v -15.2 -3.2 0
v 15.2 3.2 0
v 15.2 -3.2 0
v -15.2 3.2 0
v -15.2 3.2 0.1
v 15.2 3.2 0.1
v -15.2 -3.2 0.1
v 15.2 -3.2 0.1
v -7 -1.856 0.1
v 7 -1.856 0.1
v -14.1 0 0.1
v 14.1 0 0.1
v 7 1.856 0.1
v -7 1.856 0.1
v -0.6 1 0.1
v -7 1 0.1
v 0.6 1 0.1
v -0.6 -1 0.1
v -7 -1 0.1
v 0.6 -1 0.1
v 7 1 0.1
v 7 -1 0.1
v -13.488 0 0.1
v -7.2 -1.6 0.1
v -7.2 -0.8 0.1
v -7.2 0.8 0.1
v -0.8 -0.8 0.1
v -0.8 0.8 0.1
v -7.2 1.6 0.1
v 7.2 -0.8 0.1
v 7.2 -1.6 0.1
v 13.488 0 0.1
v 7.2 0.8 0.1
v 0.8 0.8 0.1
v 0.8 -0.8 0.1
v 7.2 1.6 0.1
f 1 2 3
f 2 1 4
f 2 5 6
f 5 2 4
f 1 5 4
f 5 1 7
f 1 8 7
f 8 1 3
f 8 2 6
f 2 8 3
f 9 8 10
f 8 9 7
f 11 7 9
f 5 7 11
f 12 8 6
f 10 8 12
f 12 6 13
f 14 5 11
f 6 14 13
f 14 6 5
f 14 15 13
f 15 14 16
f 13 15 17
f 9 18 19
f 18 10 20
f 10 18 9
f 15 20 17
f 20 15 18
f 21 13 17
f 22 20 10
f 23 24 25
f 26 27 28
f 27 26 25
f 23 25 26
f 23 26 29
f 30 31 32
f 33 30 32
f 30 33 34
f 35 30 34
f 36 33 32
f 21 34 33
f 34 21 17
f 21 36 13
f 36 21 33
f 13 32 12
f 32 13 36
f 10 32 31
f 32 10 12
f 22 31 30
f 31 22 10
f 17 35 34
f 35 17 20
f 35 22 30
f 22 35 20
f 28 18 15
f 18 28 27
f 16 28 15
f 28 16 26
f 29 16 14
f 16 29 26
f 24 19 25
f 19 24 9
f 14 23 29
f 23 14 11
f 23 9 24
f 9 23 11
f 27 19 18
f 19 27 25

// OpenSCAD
// file: ../p/4-4edge.scad
use <../lib.scad>
$fa=1; $fs=0.2;
function ldraw_lib__4_4edge(realsolid=false) = [
// 0 Circle 1.0
// 0 Name: 4-4edge.dat
// 0 Author: James Jessiman
// 0 !LDRAW_ORG Primitive UPDATE 2017-01
// 0 !LICENSE Licensed under CC BY 2.0 and CC BY 4.0 : see CAreadme.txt
// 
// 0 BFC CERTIFY CCW
  [0,"BFC","CERTIFY"],
  [0,"BFC","CCW"],
// 
// 0 !HISTORY 1998-12-15 [PTadmin] Official Update 1998-10
// 0 !HISTORY 2005-12-28 [PTadmin] Official Update 2005-01
// 0 !HISTORY 2007-06-24 [PTadmin] Header formatted for Contributor Agreement
// 0 !HISTORY 2008-07-01 [PTadmin] Official Update 2008-01
// 0 !HISTORY 2017-01-15 [Steffen] BFCed
// 0 !HISTORY 2017-12-30 [PTadmin] Official Update 2017-01
// 
// 
// 2 24 1 0 0 0.9239 0 0.3827
  [2,24,1,0,0,0.9239,0,0.3827],
// 2 24 0.9239 0 0.3827 0.7071 0 0.7071
  [2,24,0.9239,0,0.3827,0.7071,0,0.7071],
// 2 24 0.7071 0 0.7071 0.3827 0 0.9239
  [2,24,0.7071,0,0.7071,0.3827,0,0.9239],
// 2 24 0.3827 0 0.9239 0 0 1
  [2,24,0.3827,0,0.9239,0,0,1],
// 2 24 0 0 1 -0.3827 0 0.9239
  [2,24,0,0,1,-0.3827,0,0.9239],
// 2 24 -0.3827 0 0.9239 -0.7071 0 0.7071
  [2,24,-0.3827,0,0.9239,-0.7071,0,0.7071],
// 2 24 -0.7071 0 0.7071 -0.9239 0 0.3827
  [2,24,-0.7071,0,0.7071,-0.9239,0,0.3827],
// 2 24 -0.9239 0 0.3827 -1 0 -0
  [2,24,-0.9239,0,0.3827,-1,0,-0],
// 2 24 -1 0 -0 -0.9239 0 -0.3827
  [2,24,-1,0,-0,-0.9239,0,-0.3827],
// 2 24 -0.9239 0 -0.3827 -0.7071 0 -0.7071
  [2,24,-0.9239,0,-0.3827,-0.7071,0,-0.7071],
// 2 24 -0.7071 0 -0.7071 -0.3827 0 -0.9239
  [2,24,-0.7071,0,-0.7071,-0.3827,0,-0.9239],
// 2 24 -0.3827 0 -0.9239 0 0 -1
  [2,24,-0.3827,0,-0.9239,0,0,-1],
// 2 24 0 0 -1 0.3827 0 -0.9239
  [2,24,0,0,-1,0.3827,0,-0.9239],
// 2 24 0.3827 0 -0.9239 0.7071 0 -0.7071
  [2,24,0.3827,0,-0.9239,0.7071,0,-0.7071],
// 2 24 0.7071 0 -0.7071 0.9239 0 -0.3827
  [2,24,0.7071,0,-0.7071,0.9239,0,-0.3827],
// 2 24 0.9239 0 -0.3827 1 0 0
  [2,24,0.9239,0,-0.3827,1,0,0],
];
module ldraw_lib__4_4edge(step=0, col=false, unit=2/5, alt=false, line=0.2, solid=!$preview)
    makepoly(ldraw_lib__4_4edge(solid), step=step, col=col, unit=unit, alt=alt, line=line, solid=solid);
ldraw_lib__4_4edge(line=0.2);
// file: ../p/4-4disc.scad
use <../lib.scad>
$fa=1; $fs=0.2;
function ldraw_lib__4_4disc(realsolid=false) = [
// 0 Disc 1.0
// 0 Name: 4-4disc.dat
// 0 Author: James Jessiman
// 0 !LDRAW_ORG Primitive UPDATE 2002-02
// 0 !LICENSE Licensed under CC BY 2.0 and CC BY 4.0 : see CAreadme.txt
// 
// 0 BFC CERTIFY CCW
  [0,"BFC","CERTIFY"],
  [0,"BFC","CCW"],
// 
// 0 !HISTORY 1998-12-15 [PTadmin] Official Update 1998-10
// 0 !HISTORY 2002-03-23 [sbliss] Added BFC statement
// 0 !HISTORY 2002-04-25 [PTadmin] Official Update 2002-02
// 0 !HISTORY 2007-06-24 [PTadmin] Header formatted for Contributor Agreement
// 0 !HISTORY 2008-07-01 [PTadmin] Official Update 2008-01
// 
// 
// 3 16 0 0 0 1 0 0 0.9239 0 0.3827
  [3,16,0,0,0,1,0,0,0.9239,0,0.3827],
// 3 16 0 0 0 0.9239 0 0.3827 0.7071 0 0.7071
  [3,16,0,0,0,0.9239,0,0.3827,0.7071,0,0.7071],
// 3 16 0 0 0 0.7071 0 0.7071 0.3827 0 0.9239
  [3,16,0,0,0,0.7071,0,0.7071,0.3827,0,0.9239],
// 3 16 0 0 0 0.3827 0 0.9239 0 0 1
  [3,16,0,0,0,0.3827,0,0.9239,0,0,1],
// 3 16 0 0 0 0 0 1 -0.3827 0 0.9239
  [3,16,0,0,0,0,0,1,-0.3827,0,0.9239],
// 3 16 0 0 0 -0.3827 0 0.9239 -0.7071 0 0.7071
  [3,16,0,0,0,-0.3827,0,0.9239,-0.7071,0,0.7071],
// 3 16 0 0 0 -0.7071 0 0.7071 -0.9239 0 0.3827
  [3,16,0,0,0,-0.7071,0,0.7071,-0.9239,0,0.3827],
// 3 16 0 0 0 -0.9239 0 0.3827 -1 0 -0
  [3,16,0,0,0,-0.9239,0,0.3827,-1,0,-0],
// 3 16 0 0 0 -1 0 -0 -0.9239 0 -0.3827
  [3,16,0,0,0,-1,0,-0,-0.9239,0,-0.3827],
// 3 16 0 0 0 -0.9239 0 -0.3827 -0.7071 0 -0.7071
  [3,16,0,0,0,-0.9239,0,-0.3827,-0.7071,0,-0.7071],
// 3 16 0 0 0 -0.7071 0 -0.7071 -0.3827 0 -0.9239
  [3,16,0,0,0,-0.7071,0,-0.7071,-0.3827,0,-0.9239],
// 3 16 0 0 0 -0.3827 0 -0.9239 0 0 -1
  [3,16,0,0,0,-0.3827,0,-0.9239,0,0,-1],
// 3 16 0 0 0 0 0 -1 0.3827 0 -0.9239
  [3,16,0,0,0,0,0,-1,0.3827,0,-0.9239],
// 3 16 0 0 0 0.3827 0 -0.9239 0.7071 0 -0.7071
  [3,16,0,0,0,0.3827,0,-0.9239,0.7071,0,-0.7071],
// 3 16 0 0 0 0.7071 0 -0.7071 0.9239 0 -0.3827
  [3,16,0,0,0,0.7071,0,-0.7071,0.9239,0,-0.3827],
// 3 16 0 0 0 0.9239 0 -0.3827 1 0 0
  [3,16,0,0,0,0.9239,0,-0.3827,1,0,0],
// 0
];
module ldraw_lib__4_4disc(step=0, col=false, unit=2/5, alt=false, line=0.2, solid=!$preview)
    makepoly(ldraw_lib__4_4disc(solid), step=step, col=col, unit=unit, alt=alt, line=line, solid=solid);
ldraw_lib__4_4disc(line=0.2);
// file: ../p/4-4cyli.scad
use <../lib.scad>
$fa=1; $fs=0.2;
function ldraw_lib__4_4cyli(realsolid=false) = [
// 0 Cylinder 1.0
// 0 Name: 4-4cyli.dat
// 0 Author: James Jessiman
// 0 !LDRAW_ORG Primitive UPDATE 2005-01
// 0 !LICENSE Licensed under CC BY 2.0 and CC BY 4.0 : see CAreadme.txt
// 
// 0 BFC CERTIFY CCW
  [0,"BFC","CERTIFY"],
  [0,"BFC","CCW"],
// 
// 0 !HISTORY 1998-12-15 [PTadmin] Official Update 1998-10
// 0 !HISTORY 2002-03-23 [sbliss] Added BFC statement; merged headers from files in distributions LDraw 0.27 and Complete.
// 0 !HISTORY 2002-04-25 [PTadmin] Official Update 2002-02
// 0 !HISTORY 2004-12-14 [guyvivan] BFC CCW
// 0 !HISTORY 2005-12-28 [PTadmin] Official Update 2005-01
// 0 !HISTORY 2007-06-24 [PTadmin] Header formatted for Contributor Agreement
// 0 !HISTORY 2008-07-01 [PTadmin] Official Update 2008-01
// 
// 
// 4 16 1 1 0 0.9239 1 0.3827 0.9239 0 0.3827 1 0 0
  [4,16,1,1,0,0.9239,1,0.3827,0.9239,0,0.3827,1,0,0],
// 5 24 1 0 0 1 1 0 0.9239 0 0.3827 0.9239 0 -0.3827
  [5,24,1,0,0,1,1,0,0.9239,0,0.3827,0.9239,0,-0.3827],
// 4 16 0.9239 1 0.3827 0.7071 1 0.7071 0.7071 0 0.7071 0.9239 0 0.3827
  [4,16,0.9239,1,0.3827,0.7071,1,0.7071,0.7071,0,0.7071,0.9239,0,0.3827],
// 5 24 0.9239 0 0.3827 0.9239 1 0.3827 0.7071 0 0.7071 1 0 0
  [5,24,0.9239,0,0.3827,0.9239,1,0.3827,0.7071,0,0.7071,1,0,0],
// 4 16 0.7071 1 0.7071 0.3827 1 0.9239 0.3827 0 0.9239 0.7071 0 0.7071
  [4,16,0.7071,1,0.7071,0.3827,1,0.9239,0.3827,0,0.9239,0.7071,0,0.7071],
// 5 24 0.7071 0 0.7071 0.7071 1 0.7071 0.3827 0 0.9239 0.9239 0 0.3827
  [5,24,0.7071,0,0.7071,0.7071,1,0.7071,0.3827,0,0.9239,0.9239,0,0.3827],
// 4 16 0.3827 1 0.9239 0 1 1 0 0 1 0.3827 0 0.9239
  [4,16,0.3827,1,0.9239,0,1,1,0,0,1,0.3827,0,0.9239],
// 5 24 0.3827 0 0.9239 0.3827 1 0.9239 0 0 1 0.7071 0 0.7071
  [5,24,0.3827,0,0.9239,0.3827,1,0.9239,0,0,1,0.7071,0,0.7071],
// 4 16 0 1 1 -0.3827 1 0.9239 -0.3827 0 0.9239 0 0 1
  [4,16,0,1,1,-0.3827,1,0.9239,-0.3827,0,0.9239,0,0,1],
// 5 24 0 0 1 0 1 1 -0.3827 0 0.9239 0.3827 0 0.9239
  [5,24,0,0,1,0,1,1,-0.3827,0,0.9239,0.3827,0,0.9239],
// 4 16 -0.3827 1 0.9239 -0.7071 1 0.7071 -0.7071 0 0.7071 -0.3827 0 0.9239
  [4,16,-0.3827,1,0.9239,-0.7071,1,0.7071,-0.7071,0,0.7071,-0.3827,0,0.9239],
// 5 24 -0.3827 0 0.9239 -0.3827 1 0.9239 -0.7071 0 0.7071 0 0 1
  [5,24,-0.3827,0,0.9239,-0.3827,1,0.9239,-0.7071,0,0.7071,0,0,1],
// 4 16 -0.7071 1 0.7071 -0.9239 1 0.3827 -0.9239 0 0.3827 -0.7071 0 0.7071
  [4,16,-0.7071,1,0.7071,-0.9239,1,0.3827,-0.9239,0,0.3827,-0.7071,0,0.7071],
// 5 24 -0.7071 0 0.7071 -0.7071 1 0.7071 -0.9239 0 0.3827 -0.3827 0 0.9239
  [5,24,-0.7071,0,0.7071,-0.7071,1,0.7071,-0.9239,0,0.3827,-0.3827,0,0.9239],
// 4 16 -0.9239 1 0.3827 -1 1 0 -1 0 0 -0.9239 0 0.3827
  [4,16,-0.9239,1,0.3827,-1,1,0,-1,0,0,-0.9239,0,0.3827],
// 5 24 -0.9239 0 0.3827 -0.9239 1 0.3827 -1 0 0 -0.7071 0 0.7071
  [5,24,-0.9239,0,0.3827,-0.9239,1,0.3827,-1,0,0,-0.7071,0,0.7071],
// 4 16 -1 1 0 -0.9239 1 -0.3827 -0.9239 0 -0.3827 -1 0 0
  [4,16,-1,1,0,-0.9239,1,-0.3827,-0.9239,0,-0.3827,-1,0,0],
// 5 24 -1 0 0 -1 1 0 -0.9239 0 -0.3827 -0.9239 0 0.3827
  [5,24,-1,0,0,-1,1,0,-0.9239,0,-0.3827,-0.9239,0,0.3827],
// 4 16 -0.9239 1 -0.3827 -0.7071 1 -0.7071 -0.7071 0 -0.7071 -0.9239 0 -0.3827
  [4,16,-0.9239,1,-0.3827,-0.7071,1,-0.7071,-0.7071,0,-0.7071,-0.9239,0,-0.3827],
// 5 24 -0.9239 0 -0.3827 -0.9239 1 -0.3827 -0.7071 0 -0.7071 -1 0 0
  [5,24,-0.9239,0,-0.3827,-0.9239,1,-0.3827,-0.7071,0,-0.7071,-1,0,0],
// 4 16 -0.7071 1 -0.7071 -0.3827 1 -0.9239 -0.3827 0 -0.9239 -0.7071 0 -0.7071
  [4,16,-0.7071,1,-0.7071,-0.3827,1,-0.9239,-0.3827,0,-0.9239,-0.7071,0,-0.7071],
// 5 24 -0.7071 0 -0.7071 -0.7071 1 -0.7071 -0.3827 0 -0.9239 -0.9239 0 -0.3827
  [5,24,-0.7071,0,-0.7071,-0.7071,1,-0.7071,-0.3827,0,-0.9239,-0.9239,0,-0.3827],
// 4 16 -0.3827 1 -0.9239 0 1 -1 0 0 -1 -0.3827 0 -0.9239
  [4,16,-0.3827,1,-0.9239,0,1,-1,0,0,-1,-0.3827,0,-0.9239],
// 5 24 -0.3827 0 -0.9239 -0.3827 1 -0.9239 0 0 -1 -0.7071 0 -0.7071
  [5,24,-0.3827,0,-0.9239,-0.3827,1,-0.9239,0,0,-1,-0.7071,0,-0.7071],
// 4 16 0 1 -1 0.3827 1 -0.9239 0.3827 0 -0.9239 0 0 -1
  [4,16,0,1,-1,0.3827,1,-0.9239,0.3827,0,-0.9239,0,0,-1],
// 5 24 0 0 -1 0 1 -1 0.3827 0 -0.9239 -0.3827 0 -0.9239
  [5,24,0,0,-1,0,1,-1,0.3827,0,-0.9239,-0.3827,0,-0.9239],
// 4 16 0.3827 1 -0.9239 0.7071 1 -0.7071 0.7071 0 -0.7071 0.3827 0 -0.9239
  [4,16,0.3827,1,-0.9239,0.7071,1,-0.7071,0.7071,0,-0.7071,0.3827,0,-0.9239],
// 5 24 0.3827 0 -0.9239 0.3827 1 -0.9239 0.7071 0 -0.7071 0 0 -1
  [5,24,0.3827,0,-0.9239,0.3827,1,-0.9239,0.7071,0,-0.7071,0,0,-1],
// 4 16 0.7071 1 -0.7071 0.9239 1 -0.3827 0.9239 0 -0.3827 0.7071 0 -0.7071
  [4,16,0.7071,1,-0.7071,0.9239,1,-0.3827,0.9239,0,-0.3827,0.7071,0,-0.7071],
// 5 24 0.7071 0 -0.7071 0.7071 1 -0.7071 0.9239 0 -0.3827 0.3827 0 -0.9239
  [5,24,0.7071,0,-0.7071,0.7071,1,-0.7071,0.9239,0,-0.3827,0.3827,0,-0.9239],
// 4 16 0.9239 1 -0.3827 1 1 0 1 0 0 0.9239 0 -0.3827
  [4,16,0.9239,1,-0.3827,1,1,0,1,0,0,0.9239,0,-0.3827],
// 5 24 0.9239 0 -0.3827 0.9239 1 -0.3827 1 0 0 0.7071 0 -0.7071
  [5,24,0.9239,0,-0.3827,0.9239,1,-0.3827,1,0,0,0.7071,0,-0.7071],
// 0
];
module ldraw_lib__4_4cyli(step=0, col=false, unit=2/5, alt=false, line=0.2, solid=!$preview)
    makepoly(ldraw_lib__4_4cyli(solid), step=step, col=col, unit=unit, alt=alt, line=line, solid=solid);
ldraw_lib__4_4cyli(line=0.2);
// file: ../p/stud3.scad
use <../lib.scad>
use <4-4cyli.scad>
use <4-4disc.scad>
use <4-4edge.scad>
$fa=1; $fs=0.2;
function ldraw_lib__stud3(realsolid=false) = realsolid ? 
    [openscad(translate([0,0,-eps()], o=cylinder(4+eps(), r=4)),2)] : [
// 0 Stud Tube Solid
// 0 Name: stud3.dat
// 0 Author: James Jessiman
// 0 !LDRAW_ORG Primitive UPDATE 2012-01
// 0 !LICENSE Licensed under CC BY 2.0 and CC BY 4.0 : see CAreadme.txt
// 
// 0 BFC CERTIFY CCW
  [0,"BFC","CERTIFY"],
  [0,"BFC","CCW"],
// 
// 0 !HISTORY 2002-04-04 [sbliss] Modified for BFC compliance
// 0 !HISTORY 2002-04-25 [PTadmin] Official Update 2002-02
// 0 !HISTORY 2007-06-24 [PTadmin] Header formatted for Contributor Agreement
// 0 !HISTORY 2008-07-01 [PTadmin] Official Update 2008-01
// 0 !HISTORY 2012-02-16 [Philo] Changed to CCW
// 0 !HISTORY 2012-03-30 [PTadmin] Official Update 2012-01
// 
// 
// 1 16 0 -4 0 4 0 0 0 1 0 0 0 4 4-4edge.dat
  [1,16,0,-4,0,4,0,0,0,1,0,0,0,4, ldraw_lib__4_4edge(realsolid)],
// 1 16 0 0 0 4 0 0 0 1 0 0 0 4 4-4edge.dat
  [1,16,0,0,0,4,0,0,0,1,0,0,0,4, ldraw_lib__4_4edge(realsolid)],
// 1 16 0 -4 0 4 0 0 0 1 0 0 0 4 4-4disc.dat
  [1,16,0,-4,0,4,0,0,0,1,0,0,0,4, ldraw_lib__4_4disc(realsolid)],
// 1 16 0 -4 0 4 0 0 0 4 0 0 0 4 4-4cyli.dat
  [1,16,0,-4,0,4,0,0,0,4,0,0,0,4, ldraw_lib__4_4cyli(realsolid)],
];
module ldraw_lib__stud3(step=0, col=false, unit=2/5, alt=false, line=0.2, solid=!$preview)
    makepoly(ldraw_lib__stud3(solid), step=step, col=col, unit=unit, alt=alt, line=line, solid=solid);
ldraw_lib__stud3(line=0.2);
// file: ../p/stud.scad
use <../lib.scad>
use <4-4cyli.scad>
use <4-4disc.scad>
use <4-4edge.scad>
$fa=1; $fs=0.2;
function ldraw_lib__stud(realsolid=false) = realsolid ? 
    [openscad(translate([0,0,-eps()], o=cylinder(4+eps(), r=6)),2)] : [
// 0 Stud
// 0 Name: stud.dat
// 0 Author: James Jessiman
// 0 !LDRAW_ORG Primitive UPDATE 2012-01
// 0 !LICENSE Licensed under CC BY 2.0 and CC BY 4.0 : see CAreadme.txt
// 
// 0 BFC CERTIFY CCW
  [0,"BFC","CERTIFY"],
  [0,"BFC","CCW"],
// 
// 0 !HISTORY 2002-04-04 [sbliss] Modified for BFC compliance
// 0 !HISTORY 2002-04-25 [PTadmin] Official Update 2002-02
// 0 !HISTORY 2007-06-24 [PTadmin] Header formatted for Contributor Agreement
// 0 !HISTORY 2008-07-01 [PTadmin] Official Update 2008-01
// 0 !HISTORY 2012-02-16 [Philo] Changed to CCW
// 0 !HISTORY 2012-03-30 [PTadmin] Official Update 2012-01
// 
// 
// 1 16 0 0 0 6 0 0 0 1 0 0 0 6 4-4edge.dat
  [1,16,0,0,0,6,0,0,0,1,0,0,0,6, ldraw_lib__4_4edge(realsolid)],
// 1 16 0 -4 0 6 0 0 0 1 0 0 0 6 4-4edge.dat
  [1,16,0,-4,0,6,0,0,0,1,0,0,0,6, ldraw_lib__4_4edge(realsolid)],
// 1 16 0 0 0 6 0 0 0 -4 0 0 0 6 4-4cyli.dat
  [1,16,0,0,0,6,0,0,0,-4,0,0,0,6, ldraw_lib__4_4cyli(realsolid)],
// 1 16 0 -4 0 6 0 0 0 1 0 0 0 6 4-4disc.dat
  [1,16,0,-4,0,6,0,0,0,1,0,0,0,6, ldraw_lib__4_4disc(realsolid)],
];
module ldraw_lib__stud(step=0, col=false, unit=2/5, alt=false, line=0.2, solid=!$preview)
    makepoly(ldraw_lib__stud(solid), step=step, col=col, unit=unit, alt=alt, line=line, solid=solid);
ldraw_lib__stud(line=0.2);
// file: ../p/box5.scad
use <../lib.scad>
$fa=1; $fs=0.2;
function ldraw_lib__box5(realsolid=false) = [
// 0 Box with 5 Faces and All Edges
// 0 Name: box5.dat
// 0 Author: James Jessiman
// 0 !LDRAW_ORG Primitive UPDATE 2012-01
// 0 !LICENSE Licensed under CC BY 2.0 and CC BY 4.0 : see CAreadme.txt
// 
// 0 BFC CERTIFY CCW
  [0,"BFC","CERTIFY"],
  [0,"BFC","CCW"],
// 
// 0 !HISTORY 2002-04-03 [sbliss] Modified for BFC compliance
// 0 !HISTORY 2002-04-25 [PTadmin] Official Update 2002-02
// 0 !HISTORY 2007-06-24 [PTadmin] Header formatted for Contributor Agreement
// 0 !HISTORY 2008-07-01 [PTadmin] Official Update 2008-01
// 0 !HISTORY 2012-02-16 [Philo] Changed to CCW
// 0 !HISTORY 2012-03-30 [PTadmin] Official Update 2012-01
// 
// 
// 2 24 1 1 1 -1 1 1
  [2,24,1,1,1,-1,1,1],
// 2 24 -1 1 1 -1 1 -1
  [2,24,-1,1,1,-1,1,-1],
// 2 24 -1 1 -1 1 1 -1
  [2,24,-1,1,-1,1,1,-1],
// 2 24 1 1 -1 1 1 1
  [2,24,1,1,-1,1,1,1],
// 2 24 1 0 1 -1 0 1
  [2,24,1,0,1,-1,0,1],
// 2 24 -1 0 1 -1 0 -1
  [2,24,-1,0,1,-1,0,-1],
// 2 24 -1 0 -1 1 0 -1
  [2,24,-1,0,-1,1,0,-1],
// 2 24 1 0 -1 1 0 1
  [2,24,1,0,-1,1,0,1],
// 2 24 1 0 1 1 1 1
  [2,24,1,0,1,1,1,1],
// 2 24 -1 0 1 -1 1 1
  [2,24,-1,0,1,-1,1,1],
// 2 24 1 0 -1 1 1 -1
  [2,24,1,0,-1,1,1,-1],
// 2 24 -1 0 -1 -1 1 -1
  [2,24,-1,0,-1,-1,1,-1],
// 4 16 -1 1 1 1 1 1 1 1 -1 -1 1 -1
  [4,16,-1,1,1,1,1,1,1,1,-1,-1,1,-1],
// 4 16 -1 1 1 -1 0 1 1 0 1 1 1 1
  [4,16,-1,1,1,-1,0,1,1,0,1,1,1,1],
// 4 16 -1 1 -1 -1 0 -1 -1 0 1 -1 1 1
  [4,16,-1,1,-1,-1,0,-1,-1,0,1,-1,1,1],
// 4 16 1 1 -1 1 0 -1 -1 0 -1 -1 1 -1
  [4,16,1,1,-1,1,0,-1,-1,0,-1,-1,1,-1],
// 4 16 1 1 1 1 0 1 1 0 -1 1 1 -1
  [4,16,1,1,1,1,0,1,1,0,-1,1,1,-1],
];
module ldraw_lib__box5(step=0, col=false, unit=2/5, alt=false, line=0.2, solid=!$preview)
    makepoly(ldraw_lib__box5(solid), step=step, col=col, unit=unit, alt=alt, line=line, solid=solid);
ldraw_lib__box5(line=0.2);
// file: ../p/box4t.scad
use <../lib.scad>
$fa=1; $fs=0.2;
function ldraw_lib__box4t(realsolid=false) = [
// 0 Box with 4 Adjacent Faces and All Edges
// 0 Name: box4t.dat
// 0 Author: Tore Eriksson [Tore_Eriksson]
// 0 !LDRAW_ORG Primitive UPDATE 2003-02
// 0 !LICENSE Licensed under CC BY 2.0 and CC BY 4.0 : see CAreadme.txt
// 
// 0 BFC CERTIFY CCW
  [0,"BFC","CERTIFY"],
  [0,"BFC","CCW"],
// 
// 0 !HISTORY 1997-09-29 [PTadmin] Official Update 1997-15
// 0 !HISTORY 2002-08-31 [izanette] Modified with WINDZ for BFC compliance
// 0 !HISTORY 2003-08-01 [PTadmin] Official Update 2003-02
// 0 !HISTORY 2007-06-24 [PTadmin] Header formatted for Contributor Agreement
// 0 !HISTORY 2008-07-01 [PTadmin] Official Update 2008-01
// 
// 
// 2 24 1 1 1 -1 1 1
  [2,24,1,1,1,-1,1,1],
// 2 24 -1 1 1 -1 1 -1
  [2,24,-1,1,1,-1,1,-1],
// 2 24 -1 1 -1 1 1 -1
  [2,24,-1,1,-1,1,1,-1],
// 2 24 1 1 -1 1 1 1
  [2,24,1,1,-1,1,1,1],
// 2 24 1 0 1 -1 0 1
  [2,24,1,0,1,-1,0,1],
// 2 24 -1 0 1 -1 0 -1
  [2,24,-1,0,1,-1,0,-1],
// 2 24 -1 0 -1 1 0 -1
  [2,24,-1,0,-1,1,0,-1],
// 2 24 1 0 -1 1 0 1
  [2,24,1,0,-1,1,0,1],
// 2 24 1 0 1 1 1 1
  [2,24,1,0,1,1,1,1],
// 2 24 -1 0 1 -1 1 1
  [2,24,-1,0,1,-1,1,1],
// 2 24 1 0 -1 1 1 -1
  [2,24,1,0,-1,1,1,-1],
// 2 24 -1 0 -1 -1 1 -1
  [2,24,-1,0,-1,-1,1,-1],
// 4 16 1 1 1 1 1 -1 -1 1 -1 -1 1 1
  [4,16,1,1,1,1,1,-1,-1,1,-1,-1,1,1],
// 4 16 1 1 1 -1 1 1 -1 0 1 1 0 1
  [4,16,1,1,1,-1,1,1,-1,0,1,1,0,1],
// 4 16 -1 1 1 -1 1 -1 -1 0 -1 -1 0 1
  [4,16,-1,1,1,-1,1,-1,-1,0,-1,-1,0,1],
// 0 4 16 -1 1 -1 -1 0 -1 1 0 -1 1 1 -1
// 4 16 1 1 -1 1 1 1 1 0 1 1 0 -1
  [4,16,1,1,-1,1,1,1,1,0,1,1,0,-1],
// 0
];
module ldraw_lib__box4t(step=0, col=false, unit=2/5, alt=false, line=0.2, solid=!$preview)
    makepoly(ldraw_lib__box4t(solid), step=step, col=col, unit=unit, alt=alt, line=line, solid=solid);
ldraw_lib__box4t(line=0.2);
// file: s/3004s01.scad
use <../../lib.scad>
use <../../p/box4t.scad>
use <../../p/box5.scad>
use <../../p/stud.scad>
use <../../p/stud3.scad>
$fa=1; $fs=0.2;
function ldraw_lib__s__3004s01(realsolid=false) = [
// 0 ~Brick  1 x  2 without Front Face
// 0 Name: s\3004s01.dat
// 0 Author: James Jessiman
// 0 !LDRAW_ORG Subpart UPDATE 2003-03
// 0 !LICENSE Licensed under CC BY 2.0 and CC BY 4.0 : see CAreadme.txt
// 
// 0 BFC CERTIFY CCW
  [0,"BFC","CERTIFY"],
  [0,"BFC","CCW"],
// 
// 0 !HISTORY 2003-09-07 [jriley] Subfiling, BFC
// 0 !HISTORY 2003-12-19 [PTadmin] Official Update 2003-03
// 0 !HISTORY 2007-08-29 [PTadmin] Header formatted for Contributor Agreement
// 0 !HISTORY 2008-07-01 [PTadmin] Official Update 2008-01
// 
// 
// 1 16 0 4 0 1 0 0 0 -5 0 0 0 1 stud3.dat
  [1,16,0,4,0,1,0,0,0,-5,0,0,0,1, ldraw_lib__stud3(realsolid)],
// 0 BFC INVERTNEXT
  [0,"BFC","INVERTNEXT"],
// 1 16 0 24 0 16 0 0 0 -20 0 0 0 6 box5.dat
  [1,16,0,24,0,16,0,0,0,-20,0,0,0,6, ldraw_lib__box5(realsolid)],
// 4 16 20 24 10 16 24 6 -16 24 6 -20 24 10
  [4,16,20,24,10,16,24,6,-16,24,6,-20,24,10],
// 4 16 -20 24 10 -16 24 6 -16 24 -6 -20 24 -10
  [4,16,-20,24,10,-16,24,6,-16,24,-6,-20,24,-10],
// 4 16 -20 24 -10 -16 24 -6 16 24 -6 20 24 -10
  [4,16,-20,24,-10,-16,24,-6,16,24,-6,20,24,-10],
// 4 16 20 24 -10 16 24 -6 16 24 6 20 24 10
  [4,16,20,24,-10,16,24,-6,16,24,6,20,24,10],
// 1 16 0 24 0 20 0 0 0 -24 0 0 0 10 box4t.dat
  [1,16,0,24,0,20,0,0,0,-24,0,0,0,10, ldraw_lib__box4t(realsolid)],
// 1 16 10 0 0 1 0 0 0 1 0 0 0 1 stud.dat
  [1,16,10,0,0,1,0,0,0,1,0,0,0,1, ldraw_lib__stud(realsolid)],
// 1 16 -10 0 0 1 0 0 0 1 0 0 0 1 stud.dat
  [1,16,-10,0,0,1,0,0,0,1,0,0,0,1, ldraw_lib__stud(realsolid)],
// 0
];
module ldraw_lib__s__3004s01(step=0, col=false, unit=2/5, alt=false, line=0.2, solid=!$preview)
    makepoly(ldraw_lib__s__3004s01(solid), step=step, col=col, unit=unit, alt=alt, line=line, solid=solid);
ldraw_lib__s__3004s01(line=0.2);
// file: 3004.scad
use <../lib.scad>
use <s/3004s01.scad>
$fa=1; $fs=0.2;
function ldraw_lib__3004(realsolid=false) = [
// 0 Brick  1 x  2
// 0 Name: 3004.dat
// 0 Author: James Jessiman
// 0 !LDRAW_ORG Part UPDATE 2022-05
// 0 !LICENSE Licensed under CC BY 2.0 and CC BY 4.0 : see CAreadme.txt
// 
// 0 BFC CERTIFY CCW
  [0,"BFC","CERTIFY"],
  [0,"BFC","CCW"],
// 
// 0 !HISTORY 2001-10-26 [PTadmin] Official Update 2001-01
// 0 !HISTORY 2002-05-07 {unknown} BFC Certification
// 0 !HISTORY 2002-06-11 [PTadmin] Official Update 2002-03
// 0 !HISTORY 2007-05-07 [PTadmin] Header formatted for Contributor Agreement
// 0 !HISTORY 2008-07-01 [PTadmin] Official Update 2008-01
// 0 !HISTORY 2022-08-04 [MagFors] Using subfile
// 0 !HISTORY 2022-09-15 [PTadmin] Official Update 2022-05
// 
// 
// 1 16 0 0 0 1 0 0 0 1 0 0 0 1 s\3004s01.dat
  [1,16,0,0,0,1,0,0,0,1,0,0,0,1, ldraw_lib__s__3004s01(realsolid)],
// 4 16 -20 24 -10 20 24 -10 20 0 -10 -20 0 -10
  [4,16,-20,24,-10,20,24,-10,20,0,-10,-20,0,-10],
];
module ldraw_lib__3004(step=0, col=false, unit=2/5, alt=false, line=0.2, solid=!$preview)
    makepoly(ldraw_lib__3004(solid), step=step, col=col, unit=unit, alt=alt, line=line, solid=solid);
ldraw_lib__3004(line=0.2);
// file: ../p/box5-12.scad
use <../lib.scad>
$fa=1; $fs=0.2;
function ldraw_lib__box5_12(realsolid=false) = [
// 0 Box with 5 Faces without Any Edges
// 0 Name: box5-12.dat
// 0 Author: Chris Dee [cwdee]
// 0 !LDRAW_ORG Primitive UPDATE 2009-02
// 0 !LICENSE Licensed under CC BY 2.0 and CC BY 4.0 : see CAreadme.txt
// 
// 0 BFC CERTIFY CCW
  [0,"BFC","CERTIFY"],
  [0,"BFC","CCW"],
// 
// 0 !HISTORY 2009-09-03 [PTadmin] Official Update 2009-02
// 
// 
// 4 16 1 1 1 1 1 -1 -1 1 -1 -1 1 1
  [4,16,1,1,1,1,1,-1,-1,1,-1,-1,1,1],
// 4 16 -1 0 1 1 0 1 1 1 1 -1 1 1
  [4,16,-1,0,1,1,0,1,1,1,1,-1,1,1],
// 4 16 -1 0 -1 -1 0 1 -1 1 1 -1 1 -1
  [4,16,-1,0,-1,-1,0,1,-1,1,1,-1,1,-1],
// 4 16 1 0 -1 -1 0 -1 -1 1 -1 1 1 -1
  [4,16,1,0,-1,-1,0,-1,-1,1,-1,1,1,-1],
// 4 16 1 0 1 1 0 -1 1 1 -1 1 1 1
  [4,16,1,0,1,1,0,-1,1,1,-1,1,1,1],
// 0
];
module ldraw_lib__box5_12(step=0, col=false, unit=2/5, alt=false, line=0.2, solid=!$preview)
    makepoly(ldraw_lib__box5_12(solid), step=step, col=col, unit=unit, alt=alt, line=line, solid=solid);
ldraw_lib__box5_12(line=0.2);
// main file
use <../lib.scad>
use <../p/box5-12.scad>
$fa=1; $fs=0.2;
function ldraw_lib__169675e(realsolid=false) = [
// 0 Sticker  0.8 x  3.8 with Two White Opposing Direction Arrows
// 0 Name: 169675e.dat
// 0 Author: Ulrich Röder [UR]
// 0 !LDRAW_ORG Part UPDATE 2019-01
// 0 !LICENSE Licensed under CC BY 2.0 and CC BY 4.0 : see CAreadme.txt
// 
// 0 BFC CERTIFY CCW
  [0,"BFC","CERTIFY"],
  [0,"BFC","CCW"],
// 
// 0 !KEYWORDS Cargo, Set 4555, Station, Train, Transport
// 
// 0 !HISTORY 2019-06-28 [PTadmin] Official Update 2019-01
// 
// 
// 0 // Main
// 
// 1 16 0 -.25 0 38 0 0 0 .25 0 0 0 8 box5-12.dat
  [1,16,0,-.25,0,38,0,0,0,.25,0,0,0,8, ldraw_lib__box5_12(realsolid)],
// 4 16 -17.5 -.25 -4.64 -38 -.25 -8 38 -.25 -8 17.5 -.25 -4.64
  [4,16,-17.5,-.25,-4.64,-38,-.25,-8,38,-.25,-8,17.5,-.25,-4.64],
// 3 16 -35.25 -.25 0 -38 -.25 -8 -17.5 -.25 -4.64
  [3,16,-35.25,-.25,0,-38,-.25,-8,-17.5,-.25,-4.64],
// 3 16 -38 -.25 8 -38 -.25 -8 -35.25 -.25 0
  [3,16,-38,-.25,8,-38,-.25,-8,-35.25,-.25,0],
// 3 16 35.25 -.25 0 38 -.25 -8 38 -.25 8
  [3,16,35.25,-.25,0,38,-.25,-8,38,-.25,8],
// 3 16 17.5 -.25 -4.64 38 -.25 -8 35.25 -.25 0
  [3,16,17.5,-.25,-4.64,38,-.25,-8,35.25,-.25,0],
// 3 16 35.25 -.25 0 38 -.25 8 17.5 -.25 4.64
  [3,16,35.25,-.25,0,38,-.25,8,17.5,-.25,4.64],
// 3 16 -17.5 -.25 4.64 -38 -.25 8 -35.25 -.25 0
  [3,16,-17.5,-.25,4.64,-38,-.25,8,-35.25,-.25,0],
// 4 16 38 -.25 8 -38 -.25 8 -17.5 -.25 4.64 17.5 -.25 4.64
  [4,16,38,-.25,8,-38,-.25,8,-17.5,-.25,4.64,17.5,-.25,4.64],
// 4 16 17.5 -.25 4.64 -17.5 -.25 4.64 -17.5 -.25 2.5 -1.5 -.25 2.5
  [4,16,17.5,-.25,4.64,-17.5,-.25,4.64,-17.5,-.25,2.5,-1.5,-.25,2.5],
// 3 16 17.5 -.25 4.64 -1.5 -.25 2.5 1.5 -.25 2.5
  [3,16,17.5,-.25,4.64,-1.5,-.25,2.5,1.5,-.25,2.5],
// 3 16 -17.5 -.25 -4.64 -1.5 -.25 -2.5 -17.5 -.25 -2.5
  [3,16,-17.5,-.25,-4.64,-1.5,-.25,-2.5,-17.5,-.25,-2.5],
// 4 16 17.5 -.25 -4.64 1.5 -.25 -2.5 -1.5 -.25 -2.5 -17.5 -.25 -4.64
  [4,16,17.5,-.25,-4.64,1.5,-.25,-2.5,-1.5,-.25,-2.5,-17.5,-.25,-4.64],
// 4 16 -1.5 -.25 2.5 -1.5 -.25 -2.5 1.5 -.25 -2.5 1.5 -.25 2.5
  [4,16,-1.5,-.25,2.5,-1.5,-.25,-2.5,1.5,-.25,-2.5,1.5,-.25,2.5],
// 3 16 17.5 -.25 2.5 17.5 -.25 4.64 1.5 -.25 2.5
  [3,16,17.5,-.25,2.5,17.5,-.25,4.64,1.5,-.25,2.5],
// 3 16 17.5 -.25 -2.5 1.5 -.25 -2.5 17.5 -.25 -4.64
  [3,16,17.5,-.25,-2.5,1.5,-.25,-2.5,17.5,-.25,-4.64],
// 
// 0 // White
// 3 15 -33.72 -.25 0 -18 -.25 -4 -18 -.25 -2
  [3,15,-33.72,-.25,0,-18,-.25,-4,-18,-.25,-2],
// 4 15 -2 -.25 2 -18 -.25 2 -18 -.25 -2 -2 -.25 -2
  [4,15,-2,-.25,2,-18,-.25,2,-18,-.25,-2,-2,-.25,-2],
// 3 15 -33.72 -.25 0 -18 -.25 -2 -18 -.25 2
  [3,15,-33.72,-.25,0,-18,-.25,-2,-18,-.25,2],
// 3 15 -33.72 -.25 0 -18 -.25 2 -18 -.25 4
  [3,15,-33.72,-.25,0,-18,-.25,2,-18,-.25,4],
// 3 15 18 -.25 -2 18 -.25 -4 33.72 -.25 0
  [3,15,18,-.25,-2,18,-.25,-4,33.72,-.25,0],
// 4 15 2 -.25 2 18 -.25 -2 33.72 -.25 0 18 -.25 2
  [4,15,2,-.25,2,18,-.25,-2,33.72,-.25,0,18,-.25,2],
// 3 15 2 -.25 -2 18 -.25 -2 2 -.25 2
  [3,15,2,-.25,-2,18,-.25,-2,2,-.25,2],
// 3 15 18 -.25 4 18 -.25 2 33.72 -.25 0
  [3,15,18,-.25,4,18,-.25,2,33.72,-.25,0],
// 
// 0 // Black
// 4 0 1.5 -.25 2.5 2 -.25 2 18 -.25 2 17.5 -.25 2.5
  [4,0,1.5,-.25,2.5,2,-.25,2,18,-.25,2,17.5,-.25,2.5],
// 4 0 18 -.25 4 17.5 -.25 4.64 17.5 -.25 2.5 18 -.25 2
  [4,0,18,-.25,4,17.5,-.25,4.64,17.5,-.25,2.5,18,-.25,2],
// 4 0 17.5 -.25 4.64 18 -.25 4 33.72 -.25 0 35.25 -.25 0
  [4,0,17.5,-.25,4.64,18,-.25,4,33.72,-.25,0,35.25,-.25,0],
// 4 0 35.25 -.25 0 33.72 -.25 0 18 -.25 -4 17.5 -.25 -4.64
  [4,0,35.25,-.25,0,33.72,-.25,0,18,-.25,-4,17.5,-.25,-4.64],
// 4 0 18 -.25 -2 17.5 -.25 -2.5 17.5 -.25 -4.64 18 -.25 -4
  [4,0,18,-.25,-2,17.5,-.25,-2.5,17.5,-.25,-4.64,18,-.25,-4],
// 4 0 2 -.25 -2 2 -.25 2 1.5 -.25 2.5 1.5 -.25 -2.5
  [4,0,2,-.25,-2,2,-.25,2,1.5,-.25,2.5,1.5,-.25,-2.5],
// 4 0 2 -.25 -2 1.5 -.25 -2.5 17.5 -.25 -2.5 18 -.25 -2
  [4,0,2,-.25,-2,1.5,-.25,-2.5,17.5,-.25,-2.5,18,-.25,-2],
// 4 0 -1.5 -.25 2.5 -2 -.25 2 -2 -.25 -2 -1.5 -.25 -2.5
  [4,0,-1.5,-.25,2.5,-2,-.25,2,-2,-.25,-2,-1.5,-.25,-2.5],
// 4 0 -18 -.25 2 -2 -.25 2 -1.5 -.25 2.5 -17.5 -.25 2.5
  [4,0,-18,-.25,2,-2,-.25,2,-1.5,-.25,2.5,-17.5,-.25,2.5],
// 4 0 -18 -.25 4 -18 -.25 2 -17.5 -.25 2.5 -17.5 -.25 4.64
  [4,0,-18,-.25,4,-18,-.25,2,-17.5,-.25,2.5,-17.5,-.25,4.64],
// 4 0 -17.5 -.25 -4.64 -17.5 -.25 -2.5 -18 -.25 -2 -18 -.25 -4
  [4,0,-17.5,-.25,-4.64,-17.5,-.25,-2.5,-18,-.25,-2,-18,-.25,-4],
// 4 0 -33.72 -.25 0 -18 -.25 4 -17.5 -.25 4.64 -35.25 -.25 0
  [4,0,-33.72,-.25,0,-18,-.25,4,-17.5,-.25,4.64,-35.25,-.25,0],
// 4 0 -17.5 -.25 -4.64 -18 -.25 -4 -33.72 -.25 0 -35.25 -.25 0
  [4,0,-17.5,-.25,-4.64,-18,-.25,-4,-33.72,-.25,0,-35.25,-.25,0],
// 4 0 -18 -.25 -2 -17.5 -.25 -2.5 -1.5 -.25 -2.5 -2 -.25 -2
  [4,0,-18,-.25,-2,-17.5,-.25,-2.5,-1.5,-.25,-2.5,-2,-.25,-2],
];
module ldraw_lib__169675e(step=0, col=false, unit=2/5, alt=false, line=0.2, solid=!$preview)
    makepoly(ldraw_lib__169675e(solid), step=step, col=col, unit=unit, alt=alt, line=line, solid=solid);
ldraw_lib__169675e(line=0.2);
